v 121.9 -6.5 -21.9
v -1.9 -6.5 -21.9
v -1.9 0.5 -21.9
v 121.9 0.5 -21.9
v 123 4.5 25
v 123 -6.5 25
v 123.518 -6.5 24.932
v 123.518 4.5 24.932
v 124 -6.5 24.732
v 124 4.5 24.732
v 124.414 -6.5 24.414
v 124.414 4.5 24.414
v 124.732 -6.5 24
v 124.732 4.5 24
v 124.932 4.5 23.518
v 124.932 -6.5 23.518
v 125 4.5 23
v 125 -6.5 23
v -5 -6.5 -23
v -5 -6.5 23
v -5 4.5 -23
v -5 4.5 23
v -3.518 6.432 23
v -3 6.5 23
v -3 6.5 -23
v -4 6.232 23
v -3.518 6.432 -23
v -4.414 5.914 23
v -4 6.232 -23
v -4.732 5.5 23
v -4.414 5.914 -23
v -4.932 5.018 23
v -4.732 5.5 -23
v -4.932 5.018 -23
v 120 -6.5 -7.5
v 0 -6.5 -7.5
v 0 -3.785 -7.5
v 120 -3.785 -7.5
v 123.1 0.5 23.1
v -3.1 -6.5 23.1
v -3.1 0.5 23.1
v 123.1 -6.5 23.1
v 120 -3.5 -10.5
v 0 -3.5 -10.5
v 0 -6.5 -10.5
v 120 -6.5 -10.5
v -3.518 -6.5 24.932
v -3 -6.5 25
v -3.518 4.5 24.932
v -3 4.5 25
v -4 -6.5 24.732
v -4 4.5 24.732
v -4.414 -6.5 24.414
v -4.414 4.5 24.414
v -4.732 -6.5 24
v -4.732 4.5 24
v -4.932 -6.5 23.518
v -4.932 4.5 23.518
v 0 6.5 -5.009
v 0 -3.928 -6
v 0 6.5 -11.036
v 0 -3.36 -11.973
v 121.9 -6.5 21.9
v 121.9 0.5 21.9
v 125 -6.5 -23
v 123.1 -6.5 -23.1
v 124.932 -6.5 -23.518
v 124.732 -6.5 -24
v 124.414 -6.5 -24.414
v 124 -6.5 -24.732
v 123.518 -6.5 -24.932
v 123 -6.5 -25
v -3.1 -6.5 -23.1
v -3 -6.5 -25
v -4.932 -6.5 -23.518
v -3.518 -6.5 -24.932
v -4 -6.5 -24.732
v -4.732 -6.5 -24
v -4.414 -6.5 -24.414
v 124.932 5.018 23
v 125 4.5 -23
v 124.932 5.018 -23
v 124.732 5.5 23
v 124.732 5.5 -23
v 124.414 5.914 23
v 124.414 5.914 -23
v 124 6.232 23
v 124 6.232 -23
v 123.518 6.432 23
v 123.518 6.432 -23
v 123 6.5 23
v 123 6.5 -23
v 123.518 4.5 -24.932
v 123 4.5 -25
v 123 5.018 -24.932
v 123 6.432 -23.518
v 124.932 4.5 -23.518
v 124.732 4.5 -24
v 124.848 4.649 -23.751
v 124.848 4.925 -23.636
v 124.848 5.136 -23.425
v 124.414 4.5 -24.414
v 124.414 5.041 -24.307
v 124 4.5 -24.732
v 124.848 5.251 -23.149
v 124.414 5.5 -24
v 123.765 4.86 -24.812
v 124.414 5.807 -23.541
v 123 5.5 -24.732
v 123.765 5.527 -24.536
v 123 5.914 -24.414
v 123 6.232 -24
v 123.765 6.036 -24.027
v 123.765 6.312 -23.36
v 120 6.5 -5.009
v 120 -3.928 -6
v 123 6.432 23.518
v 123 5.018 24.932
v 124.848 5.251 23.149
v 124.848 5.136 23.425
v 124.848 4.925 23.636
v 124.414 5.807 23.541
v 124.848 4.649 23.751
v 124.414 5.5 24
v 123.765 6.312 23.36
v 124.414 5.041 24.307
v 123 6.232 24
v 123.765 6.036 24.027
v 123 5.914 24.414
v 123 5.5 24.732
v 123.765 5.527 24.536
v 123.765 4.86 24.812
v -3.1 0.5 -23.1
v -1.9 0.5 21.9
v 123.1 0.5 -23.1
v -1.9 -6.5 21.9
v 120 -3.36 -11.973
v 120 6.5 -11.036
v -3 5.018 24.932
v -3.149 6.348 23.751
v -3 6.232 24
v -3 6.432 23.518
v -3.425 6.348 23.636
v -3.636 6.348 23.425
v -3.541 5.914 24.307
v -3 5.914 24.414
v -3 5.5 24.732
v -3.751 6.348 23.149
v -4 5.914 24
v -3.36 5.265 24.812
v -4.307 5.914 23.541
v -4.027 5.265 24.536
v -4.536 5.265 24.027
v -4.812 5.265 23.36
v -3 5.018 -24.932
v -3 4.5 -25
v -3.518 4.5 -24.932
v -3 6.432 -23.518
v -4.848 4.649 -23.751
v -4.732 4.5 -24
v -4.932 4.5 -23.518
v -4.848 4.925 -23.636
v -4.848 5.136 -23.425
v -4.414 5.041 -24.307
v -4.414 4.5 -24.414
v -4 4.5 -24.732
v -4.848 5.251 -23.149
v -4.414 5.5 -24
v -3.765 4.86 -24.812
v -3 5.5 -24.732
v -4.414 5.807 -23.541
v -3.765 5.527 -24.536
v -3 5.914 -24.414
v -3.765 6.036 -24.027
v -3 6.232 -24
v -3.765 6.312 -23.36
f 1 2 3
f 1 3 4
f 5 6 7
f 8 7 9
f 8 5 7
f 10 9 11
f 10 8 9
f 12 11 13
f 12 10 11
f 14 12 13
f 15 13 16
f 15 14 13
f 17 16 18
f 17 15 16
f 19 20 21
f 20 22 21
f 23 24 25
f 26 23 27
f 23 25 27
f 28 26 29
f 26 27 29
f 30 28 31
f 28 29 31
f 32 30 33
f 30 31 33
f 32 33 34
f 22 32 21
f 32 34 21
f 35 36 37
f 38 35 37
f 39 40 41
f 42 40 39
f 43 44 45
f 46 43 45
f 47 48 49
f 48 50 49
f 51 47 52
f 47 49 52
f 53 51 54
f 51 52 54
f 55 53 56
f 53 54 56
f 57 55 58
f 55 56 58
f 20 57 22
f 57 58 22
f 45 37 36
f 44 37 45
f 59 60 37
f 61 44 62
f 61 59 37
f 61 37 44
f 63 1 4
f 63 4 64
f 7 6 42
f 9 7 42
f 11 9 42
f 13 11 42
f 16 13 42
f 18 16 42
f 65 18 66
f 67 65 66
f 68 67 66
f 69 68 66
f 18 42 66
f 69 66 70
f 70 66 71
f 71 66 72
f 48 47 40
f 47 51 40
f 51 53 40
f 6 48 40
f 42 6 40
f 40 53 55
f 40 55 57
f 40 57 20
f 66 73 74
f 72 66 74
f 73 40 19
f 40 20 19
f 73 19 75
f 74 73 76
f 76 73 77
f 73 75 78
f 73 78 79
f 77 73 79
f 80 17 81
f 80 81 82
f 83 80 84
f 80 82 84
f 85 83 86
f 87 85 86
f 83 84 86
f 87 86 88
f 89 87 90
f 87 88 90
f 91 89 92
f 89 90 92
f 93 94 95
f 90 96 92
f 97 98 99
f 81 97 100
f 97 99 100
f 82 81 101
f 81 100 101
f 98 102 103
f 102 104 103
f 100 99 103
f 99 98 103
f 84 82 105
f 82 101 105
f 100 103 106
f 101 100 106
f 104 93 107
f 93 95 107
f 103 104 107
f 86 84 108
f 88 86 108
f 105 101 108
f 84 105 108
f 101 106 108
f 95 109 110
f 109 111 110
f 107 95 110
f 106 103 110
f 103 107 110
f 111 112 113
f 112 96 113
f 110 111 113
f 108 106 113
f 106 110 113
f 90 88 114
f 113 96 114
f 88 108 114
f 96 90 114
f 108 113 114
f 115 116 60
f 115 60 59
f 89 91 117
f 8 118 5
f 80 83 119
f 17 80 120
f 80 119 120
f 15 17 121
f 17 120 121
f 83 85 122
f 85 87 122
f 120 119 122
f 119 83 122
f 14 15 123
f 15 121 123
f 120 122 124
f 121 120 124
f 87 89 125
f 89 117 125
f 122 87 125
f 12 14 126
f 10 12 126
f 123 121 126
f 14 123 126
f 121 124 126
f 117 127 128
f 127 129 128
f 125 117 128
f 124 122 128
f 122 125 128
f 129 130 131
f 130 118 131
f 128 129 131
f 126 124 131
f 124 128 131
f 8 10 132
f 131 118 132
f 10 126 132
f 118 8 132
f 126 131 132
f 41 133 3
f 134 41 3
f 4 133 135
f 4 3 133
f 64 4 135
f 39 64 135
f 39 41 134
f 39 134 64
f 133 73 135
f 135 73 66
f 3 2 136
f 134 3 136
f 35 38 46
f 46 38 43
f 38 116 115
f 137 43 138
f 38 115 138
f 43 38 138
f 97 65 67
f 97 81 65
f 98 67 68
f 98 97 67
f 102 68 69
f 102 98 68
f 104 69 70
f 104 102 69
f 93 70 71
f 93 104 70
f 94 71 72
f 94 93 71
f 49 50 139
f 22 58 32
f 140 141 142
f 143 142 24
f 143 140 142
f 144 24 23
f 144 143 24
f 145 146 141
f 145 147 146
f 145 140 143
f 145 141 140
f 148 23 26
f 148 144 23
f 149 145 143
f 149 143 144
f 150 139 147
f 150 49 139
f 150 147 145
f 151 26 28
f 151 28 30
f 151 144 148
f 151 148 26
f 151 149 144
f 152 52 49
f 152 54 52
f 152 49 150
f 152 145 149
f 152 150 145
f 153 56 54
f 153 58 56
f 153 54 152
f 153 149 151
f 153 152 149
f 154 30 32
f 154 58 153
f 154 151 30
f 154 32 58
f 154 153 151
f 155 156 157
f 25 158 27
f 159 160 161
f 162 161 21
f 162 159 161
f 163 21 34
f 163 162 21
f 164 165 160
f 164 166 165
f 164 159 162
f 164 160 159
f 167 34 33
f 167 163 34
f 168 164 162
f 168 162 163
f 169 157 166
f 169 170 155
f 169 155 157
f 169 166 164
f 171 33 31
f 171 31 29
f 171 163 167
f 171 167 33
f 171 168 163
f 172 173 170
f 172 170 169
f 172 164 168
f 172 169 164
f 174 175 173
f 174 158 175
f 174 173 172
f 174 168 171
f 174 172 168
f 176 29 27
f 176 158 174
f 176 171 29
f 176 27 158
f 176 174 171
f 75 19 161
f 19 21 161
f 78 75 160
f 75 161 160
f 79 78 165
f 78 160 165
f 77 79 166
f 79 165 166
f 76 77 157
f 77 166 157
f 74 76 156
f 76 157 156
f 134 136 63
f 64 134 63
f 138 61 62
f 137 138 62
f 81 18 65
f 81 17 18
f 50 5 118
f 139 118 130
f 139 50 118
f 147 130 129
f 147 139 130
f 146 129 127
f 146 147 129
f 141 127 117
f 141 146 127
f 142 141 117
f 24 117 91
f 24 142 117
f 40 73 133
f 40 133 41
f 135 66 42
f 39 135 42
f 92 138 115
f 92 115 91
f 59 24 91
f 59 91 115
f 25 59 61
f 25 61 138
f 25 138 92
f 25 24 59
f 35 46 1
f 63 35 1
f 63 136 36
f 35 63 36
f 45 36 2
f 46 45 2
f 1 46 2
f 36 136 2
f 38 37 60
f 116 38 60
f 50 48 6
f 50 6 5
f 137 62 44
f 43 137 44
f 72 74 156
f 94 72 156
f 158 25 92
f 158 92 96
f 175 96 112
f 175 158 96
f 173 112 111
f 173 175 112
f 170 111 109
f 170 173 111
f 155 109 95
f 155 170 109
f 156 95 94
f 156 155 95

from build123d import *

# Parameters (mm, degrees)
P_IDAT_VYSUNUT_M10_DEPTH   = 120
P_IDAT_VYSUNUT_M10_2_DEPTH = 120
SKICA8_3_W                 = 50
SKICA8_3_H                 = 13
P_IDAT_VYSUNUT_M11_DEPTH   = 5
SKICA12_W                  = 50
SKICA12_H                  = 13
P_IDAT_VYSUNUT_M13_DEPTH   = 5
SKICA13_W                  = 126.2
SKICA13_H                  = 46.2
SKICA13_W_2                = 123.8
SKICA13_H_2                = 43.8
ODEBRAT_VYSUNUT_M1_DEPTH   = 7
ZAOBLIT2_R                 = 2


with BuildPart() as part:
    # Skica8 → Přidat vysunutím10 (new body)
    with BuildSketch(Plane(origin=(0, 0, 0), x_dir=(0, 0, -1), z_dir=(1, 0, 0))):
        Polygon((6, -3.927822333), (5.008609938, 6.5), (-25, 6.5), (-25, -6.5), (7.5, -6.5), (7.5, -3.785214889), align=None)
    extrude(amount=P_IDAT_VYSUNUT_M10_DEPTH)



with BuildPart() as body_2:
    # Skica8 → P_idat vysunut_m10 2 (new body)
    with BuildSketch(Plane(origin=(0, 0, 0), x_dir=(0, 0, -1), z_dir=(1, 0, 0))):
        Polygon((25, 6.5), (11.035664785, 6.5), (11.973066599, -3.359953158), (10.5, -3.5), (10.5, -6.5), (25, -6.5), align=None)
    extrude(amount=P_IDAT_VYSUNUT_M10_2_DEPTH)


with BuildPart() as part_1:
    add(part.part)

    add(body_2.part)  # Přidat vysunutím11 merges body 2
    # Skica8<3> → Přidat vysunutím11 (add)
    with BuildSketch(Plane(origin=(0, 0, 0), x_dir=(0, 0, -1), z_dir=(1, 0, 0))):
        Rectangle(SKICA8_3_W, SKICA8_3_H)
    extrude(amount=-P_IDAT_VYSUNUT_M11_DEPTH)

    # Skica12 → Přidat vysunutím13 (add)
    with BuildSketch(Plane(origin=(120, 0, 0), x_dir=(0, 0, -1), z_dir=(1, 0, 0))):
        Rectangle(SKICA12_W, SKICA12_H)
    extrude(amount=P_IDAT_VYSUNUT_M13_DEPTH)

    # Skica13 → Odebrat vysunutím1 (cut)
    with BuildSketch(Plane.XZ.offset(6.5)):
        with Locations((60, 0)):
            Rectangle(SKICA13_W, SKICA13_H)
        with Locations((60, 0)):
            Rectangle(SKICA13_W_2, SKICA13_H_2, mode=Mode.SUBTRACT)
    extrude(amount=-ODEBRAT_VYSUNUT_M1_DEPTH, mode=Mode.SUBTRACT)

    # Zaoblit2
    zaoblit2_edges = [part_1.edges().sort_by_distance(p)[0] for p in [
        (-5, 6.5, 0),
        (60, 6.5, -25),
        (125, 6.5, 0),
        (60, 6.5, 25),
        (125, 0, 25),
        (-5, 0, 25),
        (-5, 0, -25),
        (125, 0, -25),
    ]]
    fillet(zaoblit2_edges, radius=ZAOBLIT2_R)


solid = part_1.part
